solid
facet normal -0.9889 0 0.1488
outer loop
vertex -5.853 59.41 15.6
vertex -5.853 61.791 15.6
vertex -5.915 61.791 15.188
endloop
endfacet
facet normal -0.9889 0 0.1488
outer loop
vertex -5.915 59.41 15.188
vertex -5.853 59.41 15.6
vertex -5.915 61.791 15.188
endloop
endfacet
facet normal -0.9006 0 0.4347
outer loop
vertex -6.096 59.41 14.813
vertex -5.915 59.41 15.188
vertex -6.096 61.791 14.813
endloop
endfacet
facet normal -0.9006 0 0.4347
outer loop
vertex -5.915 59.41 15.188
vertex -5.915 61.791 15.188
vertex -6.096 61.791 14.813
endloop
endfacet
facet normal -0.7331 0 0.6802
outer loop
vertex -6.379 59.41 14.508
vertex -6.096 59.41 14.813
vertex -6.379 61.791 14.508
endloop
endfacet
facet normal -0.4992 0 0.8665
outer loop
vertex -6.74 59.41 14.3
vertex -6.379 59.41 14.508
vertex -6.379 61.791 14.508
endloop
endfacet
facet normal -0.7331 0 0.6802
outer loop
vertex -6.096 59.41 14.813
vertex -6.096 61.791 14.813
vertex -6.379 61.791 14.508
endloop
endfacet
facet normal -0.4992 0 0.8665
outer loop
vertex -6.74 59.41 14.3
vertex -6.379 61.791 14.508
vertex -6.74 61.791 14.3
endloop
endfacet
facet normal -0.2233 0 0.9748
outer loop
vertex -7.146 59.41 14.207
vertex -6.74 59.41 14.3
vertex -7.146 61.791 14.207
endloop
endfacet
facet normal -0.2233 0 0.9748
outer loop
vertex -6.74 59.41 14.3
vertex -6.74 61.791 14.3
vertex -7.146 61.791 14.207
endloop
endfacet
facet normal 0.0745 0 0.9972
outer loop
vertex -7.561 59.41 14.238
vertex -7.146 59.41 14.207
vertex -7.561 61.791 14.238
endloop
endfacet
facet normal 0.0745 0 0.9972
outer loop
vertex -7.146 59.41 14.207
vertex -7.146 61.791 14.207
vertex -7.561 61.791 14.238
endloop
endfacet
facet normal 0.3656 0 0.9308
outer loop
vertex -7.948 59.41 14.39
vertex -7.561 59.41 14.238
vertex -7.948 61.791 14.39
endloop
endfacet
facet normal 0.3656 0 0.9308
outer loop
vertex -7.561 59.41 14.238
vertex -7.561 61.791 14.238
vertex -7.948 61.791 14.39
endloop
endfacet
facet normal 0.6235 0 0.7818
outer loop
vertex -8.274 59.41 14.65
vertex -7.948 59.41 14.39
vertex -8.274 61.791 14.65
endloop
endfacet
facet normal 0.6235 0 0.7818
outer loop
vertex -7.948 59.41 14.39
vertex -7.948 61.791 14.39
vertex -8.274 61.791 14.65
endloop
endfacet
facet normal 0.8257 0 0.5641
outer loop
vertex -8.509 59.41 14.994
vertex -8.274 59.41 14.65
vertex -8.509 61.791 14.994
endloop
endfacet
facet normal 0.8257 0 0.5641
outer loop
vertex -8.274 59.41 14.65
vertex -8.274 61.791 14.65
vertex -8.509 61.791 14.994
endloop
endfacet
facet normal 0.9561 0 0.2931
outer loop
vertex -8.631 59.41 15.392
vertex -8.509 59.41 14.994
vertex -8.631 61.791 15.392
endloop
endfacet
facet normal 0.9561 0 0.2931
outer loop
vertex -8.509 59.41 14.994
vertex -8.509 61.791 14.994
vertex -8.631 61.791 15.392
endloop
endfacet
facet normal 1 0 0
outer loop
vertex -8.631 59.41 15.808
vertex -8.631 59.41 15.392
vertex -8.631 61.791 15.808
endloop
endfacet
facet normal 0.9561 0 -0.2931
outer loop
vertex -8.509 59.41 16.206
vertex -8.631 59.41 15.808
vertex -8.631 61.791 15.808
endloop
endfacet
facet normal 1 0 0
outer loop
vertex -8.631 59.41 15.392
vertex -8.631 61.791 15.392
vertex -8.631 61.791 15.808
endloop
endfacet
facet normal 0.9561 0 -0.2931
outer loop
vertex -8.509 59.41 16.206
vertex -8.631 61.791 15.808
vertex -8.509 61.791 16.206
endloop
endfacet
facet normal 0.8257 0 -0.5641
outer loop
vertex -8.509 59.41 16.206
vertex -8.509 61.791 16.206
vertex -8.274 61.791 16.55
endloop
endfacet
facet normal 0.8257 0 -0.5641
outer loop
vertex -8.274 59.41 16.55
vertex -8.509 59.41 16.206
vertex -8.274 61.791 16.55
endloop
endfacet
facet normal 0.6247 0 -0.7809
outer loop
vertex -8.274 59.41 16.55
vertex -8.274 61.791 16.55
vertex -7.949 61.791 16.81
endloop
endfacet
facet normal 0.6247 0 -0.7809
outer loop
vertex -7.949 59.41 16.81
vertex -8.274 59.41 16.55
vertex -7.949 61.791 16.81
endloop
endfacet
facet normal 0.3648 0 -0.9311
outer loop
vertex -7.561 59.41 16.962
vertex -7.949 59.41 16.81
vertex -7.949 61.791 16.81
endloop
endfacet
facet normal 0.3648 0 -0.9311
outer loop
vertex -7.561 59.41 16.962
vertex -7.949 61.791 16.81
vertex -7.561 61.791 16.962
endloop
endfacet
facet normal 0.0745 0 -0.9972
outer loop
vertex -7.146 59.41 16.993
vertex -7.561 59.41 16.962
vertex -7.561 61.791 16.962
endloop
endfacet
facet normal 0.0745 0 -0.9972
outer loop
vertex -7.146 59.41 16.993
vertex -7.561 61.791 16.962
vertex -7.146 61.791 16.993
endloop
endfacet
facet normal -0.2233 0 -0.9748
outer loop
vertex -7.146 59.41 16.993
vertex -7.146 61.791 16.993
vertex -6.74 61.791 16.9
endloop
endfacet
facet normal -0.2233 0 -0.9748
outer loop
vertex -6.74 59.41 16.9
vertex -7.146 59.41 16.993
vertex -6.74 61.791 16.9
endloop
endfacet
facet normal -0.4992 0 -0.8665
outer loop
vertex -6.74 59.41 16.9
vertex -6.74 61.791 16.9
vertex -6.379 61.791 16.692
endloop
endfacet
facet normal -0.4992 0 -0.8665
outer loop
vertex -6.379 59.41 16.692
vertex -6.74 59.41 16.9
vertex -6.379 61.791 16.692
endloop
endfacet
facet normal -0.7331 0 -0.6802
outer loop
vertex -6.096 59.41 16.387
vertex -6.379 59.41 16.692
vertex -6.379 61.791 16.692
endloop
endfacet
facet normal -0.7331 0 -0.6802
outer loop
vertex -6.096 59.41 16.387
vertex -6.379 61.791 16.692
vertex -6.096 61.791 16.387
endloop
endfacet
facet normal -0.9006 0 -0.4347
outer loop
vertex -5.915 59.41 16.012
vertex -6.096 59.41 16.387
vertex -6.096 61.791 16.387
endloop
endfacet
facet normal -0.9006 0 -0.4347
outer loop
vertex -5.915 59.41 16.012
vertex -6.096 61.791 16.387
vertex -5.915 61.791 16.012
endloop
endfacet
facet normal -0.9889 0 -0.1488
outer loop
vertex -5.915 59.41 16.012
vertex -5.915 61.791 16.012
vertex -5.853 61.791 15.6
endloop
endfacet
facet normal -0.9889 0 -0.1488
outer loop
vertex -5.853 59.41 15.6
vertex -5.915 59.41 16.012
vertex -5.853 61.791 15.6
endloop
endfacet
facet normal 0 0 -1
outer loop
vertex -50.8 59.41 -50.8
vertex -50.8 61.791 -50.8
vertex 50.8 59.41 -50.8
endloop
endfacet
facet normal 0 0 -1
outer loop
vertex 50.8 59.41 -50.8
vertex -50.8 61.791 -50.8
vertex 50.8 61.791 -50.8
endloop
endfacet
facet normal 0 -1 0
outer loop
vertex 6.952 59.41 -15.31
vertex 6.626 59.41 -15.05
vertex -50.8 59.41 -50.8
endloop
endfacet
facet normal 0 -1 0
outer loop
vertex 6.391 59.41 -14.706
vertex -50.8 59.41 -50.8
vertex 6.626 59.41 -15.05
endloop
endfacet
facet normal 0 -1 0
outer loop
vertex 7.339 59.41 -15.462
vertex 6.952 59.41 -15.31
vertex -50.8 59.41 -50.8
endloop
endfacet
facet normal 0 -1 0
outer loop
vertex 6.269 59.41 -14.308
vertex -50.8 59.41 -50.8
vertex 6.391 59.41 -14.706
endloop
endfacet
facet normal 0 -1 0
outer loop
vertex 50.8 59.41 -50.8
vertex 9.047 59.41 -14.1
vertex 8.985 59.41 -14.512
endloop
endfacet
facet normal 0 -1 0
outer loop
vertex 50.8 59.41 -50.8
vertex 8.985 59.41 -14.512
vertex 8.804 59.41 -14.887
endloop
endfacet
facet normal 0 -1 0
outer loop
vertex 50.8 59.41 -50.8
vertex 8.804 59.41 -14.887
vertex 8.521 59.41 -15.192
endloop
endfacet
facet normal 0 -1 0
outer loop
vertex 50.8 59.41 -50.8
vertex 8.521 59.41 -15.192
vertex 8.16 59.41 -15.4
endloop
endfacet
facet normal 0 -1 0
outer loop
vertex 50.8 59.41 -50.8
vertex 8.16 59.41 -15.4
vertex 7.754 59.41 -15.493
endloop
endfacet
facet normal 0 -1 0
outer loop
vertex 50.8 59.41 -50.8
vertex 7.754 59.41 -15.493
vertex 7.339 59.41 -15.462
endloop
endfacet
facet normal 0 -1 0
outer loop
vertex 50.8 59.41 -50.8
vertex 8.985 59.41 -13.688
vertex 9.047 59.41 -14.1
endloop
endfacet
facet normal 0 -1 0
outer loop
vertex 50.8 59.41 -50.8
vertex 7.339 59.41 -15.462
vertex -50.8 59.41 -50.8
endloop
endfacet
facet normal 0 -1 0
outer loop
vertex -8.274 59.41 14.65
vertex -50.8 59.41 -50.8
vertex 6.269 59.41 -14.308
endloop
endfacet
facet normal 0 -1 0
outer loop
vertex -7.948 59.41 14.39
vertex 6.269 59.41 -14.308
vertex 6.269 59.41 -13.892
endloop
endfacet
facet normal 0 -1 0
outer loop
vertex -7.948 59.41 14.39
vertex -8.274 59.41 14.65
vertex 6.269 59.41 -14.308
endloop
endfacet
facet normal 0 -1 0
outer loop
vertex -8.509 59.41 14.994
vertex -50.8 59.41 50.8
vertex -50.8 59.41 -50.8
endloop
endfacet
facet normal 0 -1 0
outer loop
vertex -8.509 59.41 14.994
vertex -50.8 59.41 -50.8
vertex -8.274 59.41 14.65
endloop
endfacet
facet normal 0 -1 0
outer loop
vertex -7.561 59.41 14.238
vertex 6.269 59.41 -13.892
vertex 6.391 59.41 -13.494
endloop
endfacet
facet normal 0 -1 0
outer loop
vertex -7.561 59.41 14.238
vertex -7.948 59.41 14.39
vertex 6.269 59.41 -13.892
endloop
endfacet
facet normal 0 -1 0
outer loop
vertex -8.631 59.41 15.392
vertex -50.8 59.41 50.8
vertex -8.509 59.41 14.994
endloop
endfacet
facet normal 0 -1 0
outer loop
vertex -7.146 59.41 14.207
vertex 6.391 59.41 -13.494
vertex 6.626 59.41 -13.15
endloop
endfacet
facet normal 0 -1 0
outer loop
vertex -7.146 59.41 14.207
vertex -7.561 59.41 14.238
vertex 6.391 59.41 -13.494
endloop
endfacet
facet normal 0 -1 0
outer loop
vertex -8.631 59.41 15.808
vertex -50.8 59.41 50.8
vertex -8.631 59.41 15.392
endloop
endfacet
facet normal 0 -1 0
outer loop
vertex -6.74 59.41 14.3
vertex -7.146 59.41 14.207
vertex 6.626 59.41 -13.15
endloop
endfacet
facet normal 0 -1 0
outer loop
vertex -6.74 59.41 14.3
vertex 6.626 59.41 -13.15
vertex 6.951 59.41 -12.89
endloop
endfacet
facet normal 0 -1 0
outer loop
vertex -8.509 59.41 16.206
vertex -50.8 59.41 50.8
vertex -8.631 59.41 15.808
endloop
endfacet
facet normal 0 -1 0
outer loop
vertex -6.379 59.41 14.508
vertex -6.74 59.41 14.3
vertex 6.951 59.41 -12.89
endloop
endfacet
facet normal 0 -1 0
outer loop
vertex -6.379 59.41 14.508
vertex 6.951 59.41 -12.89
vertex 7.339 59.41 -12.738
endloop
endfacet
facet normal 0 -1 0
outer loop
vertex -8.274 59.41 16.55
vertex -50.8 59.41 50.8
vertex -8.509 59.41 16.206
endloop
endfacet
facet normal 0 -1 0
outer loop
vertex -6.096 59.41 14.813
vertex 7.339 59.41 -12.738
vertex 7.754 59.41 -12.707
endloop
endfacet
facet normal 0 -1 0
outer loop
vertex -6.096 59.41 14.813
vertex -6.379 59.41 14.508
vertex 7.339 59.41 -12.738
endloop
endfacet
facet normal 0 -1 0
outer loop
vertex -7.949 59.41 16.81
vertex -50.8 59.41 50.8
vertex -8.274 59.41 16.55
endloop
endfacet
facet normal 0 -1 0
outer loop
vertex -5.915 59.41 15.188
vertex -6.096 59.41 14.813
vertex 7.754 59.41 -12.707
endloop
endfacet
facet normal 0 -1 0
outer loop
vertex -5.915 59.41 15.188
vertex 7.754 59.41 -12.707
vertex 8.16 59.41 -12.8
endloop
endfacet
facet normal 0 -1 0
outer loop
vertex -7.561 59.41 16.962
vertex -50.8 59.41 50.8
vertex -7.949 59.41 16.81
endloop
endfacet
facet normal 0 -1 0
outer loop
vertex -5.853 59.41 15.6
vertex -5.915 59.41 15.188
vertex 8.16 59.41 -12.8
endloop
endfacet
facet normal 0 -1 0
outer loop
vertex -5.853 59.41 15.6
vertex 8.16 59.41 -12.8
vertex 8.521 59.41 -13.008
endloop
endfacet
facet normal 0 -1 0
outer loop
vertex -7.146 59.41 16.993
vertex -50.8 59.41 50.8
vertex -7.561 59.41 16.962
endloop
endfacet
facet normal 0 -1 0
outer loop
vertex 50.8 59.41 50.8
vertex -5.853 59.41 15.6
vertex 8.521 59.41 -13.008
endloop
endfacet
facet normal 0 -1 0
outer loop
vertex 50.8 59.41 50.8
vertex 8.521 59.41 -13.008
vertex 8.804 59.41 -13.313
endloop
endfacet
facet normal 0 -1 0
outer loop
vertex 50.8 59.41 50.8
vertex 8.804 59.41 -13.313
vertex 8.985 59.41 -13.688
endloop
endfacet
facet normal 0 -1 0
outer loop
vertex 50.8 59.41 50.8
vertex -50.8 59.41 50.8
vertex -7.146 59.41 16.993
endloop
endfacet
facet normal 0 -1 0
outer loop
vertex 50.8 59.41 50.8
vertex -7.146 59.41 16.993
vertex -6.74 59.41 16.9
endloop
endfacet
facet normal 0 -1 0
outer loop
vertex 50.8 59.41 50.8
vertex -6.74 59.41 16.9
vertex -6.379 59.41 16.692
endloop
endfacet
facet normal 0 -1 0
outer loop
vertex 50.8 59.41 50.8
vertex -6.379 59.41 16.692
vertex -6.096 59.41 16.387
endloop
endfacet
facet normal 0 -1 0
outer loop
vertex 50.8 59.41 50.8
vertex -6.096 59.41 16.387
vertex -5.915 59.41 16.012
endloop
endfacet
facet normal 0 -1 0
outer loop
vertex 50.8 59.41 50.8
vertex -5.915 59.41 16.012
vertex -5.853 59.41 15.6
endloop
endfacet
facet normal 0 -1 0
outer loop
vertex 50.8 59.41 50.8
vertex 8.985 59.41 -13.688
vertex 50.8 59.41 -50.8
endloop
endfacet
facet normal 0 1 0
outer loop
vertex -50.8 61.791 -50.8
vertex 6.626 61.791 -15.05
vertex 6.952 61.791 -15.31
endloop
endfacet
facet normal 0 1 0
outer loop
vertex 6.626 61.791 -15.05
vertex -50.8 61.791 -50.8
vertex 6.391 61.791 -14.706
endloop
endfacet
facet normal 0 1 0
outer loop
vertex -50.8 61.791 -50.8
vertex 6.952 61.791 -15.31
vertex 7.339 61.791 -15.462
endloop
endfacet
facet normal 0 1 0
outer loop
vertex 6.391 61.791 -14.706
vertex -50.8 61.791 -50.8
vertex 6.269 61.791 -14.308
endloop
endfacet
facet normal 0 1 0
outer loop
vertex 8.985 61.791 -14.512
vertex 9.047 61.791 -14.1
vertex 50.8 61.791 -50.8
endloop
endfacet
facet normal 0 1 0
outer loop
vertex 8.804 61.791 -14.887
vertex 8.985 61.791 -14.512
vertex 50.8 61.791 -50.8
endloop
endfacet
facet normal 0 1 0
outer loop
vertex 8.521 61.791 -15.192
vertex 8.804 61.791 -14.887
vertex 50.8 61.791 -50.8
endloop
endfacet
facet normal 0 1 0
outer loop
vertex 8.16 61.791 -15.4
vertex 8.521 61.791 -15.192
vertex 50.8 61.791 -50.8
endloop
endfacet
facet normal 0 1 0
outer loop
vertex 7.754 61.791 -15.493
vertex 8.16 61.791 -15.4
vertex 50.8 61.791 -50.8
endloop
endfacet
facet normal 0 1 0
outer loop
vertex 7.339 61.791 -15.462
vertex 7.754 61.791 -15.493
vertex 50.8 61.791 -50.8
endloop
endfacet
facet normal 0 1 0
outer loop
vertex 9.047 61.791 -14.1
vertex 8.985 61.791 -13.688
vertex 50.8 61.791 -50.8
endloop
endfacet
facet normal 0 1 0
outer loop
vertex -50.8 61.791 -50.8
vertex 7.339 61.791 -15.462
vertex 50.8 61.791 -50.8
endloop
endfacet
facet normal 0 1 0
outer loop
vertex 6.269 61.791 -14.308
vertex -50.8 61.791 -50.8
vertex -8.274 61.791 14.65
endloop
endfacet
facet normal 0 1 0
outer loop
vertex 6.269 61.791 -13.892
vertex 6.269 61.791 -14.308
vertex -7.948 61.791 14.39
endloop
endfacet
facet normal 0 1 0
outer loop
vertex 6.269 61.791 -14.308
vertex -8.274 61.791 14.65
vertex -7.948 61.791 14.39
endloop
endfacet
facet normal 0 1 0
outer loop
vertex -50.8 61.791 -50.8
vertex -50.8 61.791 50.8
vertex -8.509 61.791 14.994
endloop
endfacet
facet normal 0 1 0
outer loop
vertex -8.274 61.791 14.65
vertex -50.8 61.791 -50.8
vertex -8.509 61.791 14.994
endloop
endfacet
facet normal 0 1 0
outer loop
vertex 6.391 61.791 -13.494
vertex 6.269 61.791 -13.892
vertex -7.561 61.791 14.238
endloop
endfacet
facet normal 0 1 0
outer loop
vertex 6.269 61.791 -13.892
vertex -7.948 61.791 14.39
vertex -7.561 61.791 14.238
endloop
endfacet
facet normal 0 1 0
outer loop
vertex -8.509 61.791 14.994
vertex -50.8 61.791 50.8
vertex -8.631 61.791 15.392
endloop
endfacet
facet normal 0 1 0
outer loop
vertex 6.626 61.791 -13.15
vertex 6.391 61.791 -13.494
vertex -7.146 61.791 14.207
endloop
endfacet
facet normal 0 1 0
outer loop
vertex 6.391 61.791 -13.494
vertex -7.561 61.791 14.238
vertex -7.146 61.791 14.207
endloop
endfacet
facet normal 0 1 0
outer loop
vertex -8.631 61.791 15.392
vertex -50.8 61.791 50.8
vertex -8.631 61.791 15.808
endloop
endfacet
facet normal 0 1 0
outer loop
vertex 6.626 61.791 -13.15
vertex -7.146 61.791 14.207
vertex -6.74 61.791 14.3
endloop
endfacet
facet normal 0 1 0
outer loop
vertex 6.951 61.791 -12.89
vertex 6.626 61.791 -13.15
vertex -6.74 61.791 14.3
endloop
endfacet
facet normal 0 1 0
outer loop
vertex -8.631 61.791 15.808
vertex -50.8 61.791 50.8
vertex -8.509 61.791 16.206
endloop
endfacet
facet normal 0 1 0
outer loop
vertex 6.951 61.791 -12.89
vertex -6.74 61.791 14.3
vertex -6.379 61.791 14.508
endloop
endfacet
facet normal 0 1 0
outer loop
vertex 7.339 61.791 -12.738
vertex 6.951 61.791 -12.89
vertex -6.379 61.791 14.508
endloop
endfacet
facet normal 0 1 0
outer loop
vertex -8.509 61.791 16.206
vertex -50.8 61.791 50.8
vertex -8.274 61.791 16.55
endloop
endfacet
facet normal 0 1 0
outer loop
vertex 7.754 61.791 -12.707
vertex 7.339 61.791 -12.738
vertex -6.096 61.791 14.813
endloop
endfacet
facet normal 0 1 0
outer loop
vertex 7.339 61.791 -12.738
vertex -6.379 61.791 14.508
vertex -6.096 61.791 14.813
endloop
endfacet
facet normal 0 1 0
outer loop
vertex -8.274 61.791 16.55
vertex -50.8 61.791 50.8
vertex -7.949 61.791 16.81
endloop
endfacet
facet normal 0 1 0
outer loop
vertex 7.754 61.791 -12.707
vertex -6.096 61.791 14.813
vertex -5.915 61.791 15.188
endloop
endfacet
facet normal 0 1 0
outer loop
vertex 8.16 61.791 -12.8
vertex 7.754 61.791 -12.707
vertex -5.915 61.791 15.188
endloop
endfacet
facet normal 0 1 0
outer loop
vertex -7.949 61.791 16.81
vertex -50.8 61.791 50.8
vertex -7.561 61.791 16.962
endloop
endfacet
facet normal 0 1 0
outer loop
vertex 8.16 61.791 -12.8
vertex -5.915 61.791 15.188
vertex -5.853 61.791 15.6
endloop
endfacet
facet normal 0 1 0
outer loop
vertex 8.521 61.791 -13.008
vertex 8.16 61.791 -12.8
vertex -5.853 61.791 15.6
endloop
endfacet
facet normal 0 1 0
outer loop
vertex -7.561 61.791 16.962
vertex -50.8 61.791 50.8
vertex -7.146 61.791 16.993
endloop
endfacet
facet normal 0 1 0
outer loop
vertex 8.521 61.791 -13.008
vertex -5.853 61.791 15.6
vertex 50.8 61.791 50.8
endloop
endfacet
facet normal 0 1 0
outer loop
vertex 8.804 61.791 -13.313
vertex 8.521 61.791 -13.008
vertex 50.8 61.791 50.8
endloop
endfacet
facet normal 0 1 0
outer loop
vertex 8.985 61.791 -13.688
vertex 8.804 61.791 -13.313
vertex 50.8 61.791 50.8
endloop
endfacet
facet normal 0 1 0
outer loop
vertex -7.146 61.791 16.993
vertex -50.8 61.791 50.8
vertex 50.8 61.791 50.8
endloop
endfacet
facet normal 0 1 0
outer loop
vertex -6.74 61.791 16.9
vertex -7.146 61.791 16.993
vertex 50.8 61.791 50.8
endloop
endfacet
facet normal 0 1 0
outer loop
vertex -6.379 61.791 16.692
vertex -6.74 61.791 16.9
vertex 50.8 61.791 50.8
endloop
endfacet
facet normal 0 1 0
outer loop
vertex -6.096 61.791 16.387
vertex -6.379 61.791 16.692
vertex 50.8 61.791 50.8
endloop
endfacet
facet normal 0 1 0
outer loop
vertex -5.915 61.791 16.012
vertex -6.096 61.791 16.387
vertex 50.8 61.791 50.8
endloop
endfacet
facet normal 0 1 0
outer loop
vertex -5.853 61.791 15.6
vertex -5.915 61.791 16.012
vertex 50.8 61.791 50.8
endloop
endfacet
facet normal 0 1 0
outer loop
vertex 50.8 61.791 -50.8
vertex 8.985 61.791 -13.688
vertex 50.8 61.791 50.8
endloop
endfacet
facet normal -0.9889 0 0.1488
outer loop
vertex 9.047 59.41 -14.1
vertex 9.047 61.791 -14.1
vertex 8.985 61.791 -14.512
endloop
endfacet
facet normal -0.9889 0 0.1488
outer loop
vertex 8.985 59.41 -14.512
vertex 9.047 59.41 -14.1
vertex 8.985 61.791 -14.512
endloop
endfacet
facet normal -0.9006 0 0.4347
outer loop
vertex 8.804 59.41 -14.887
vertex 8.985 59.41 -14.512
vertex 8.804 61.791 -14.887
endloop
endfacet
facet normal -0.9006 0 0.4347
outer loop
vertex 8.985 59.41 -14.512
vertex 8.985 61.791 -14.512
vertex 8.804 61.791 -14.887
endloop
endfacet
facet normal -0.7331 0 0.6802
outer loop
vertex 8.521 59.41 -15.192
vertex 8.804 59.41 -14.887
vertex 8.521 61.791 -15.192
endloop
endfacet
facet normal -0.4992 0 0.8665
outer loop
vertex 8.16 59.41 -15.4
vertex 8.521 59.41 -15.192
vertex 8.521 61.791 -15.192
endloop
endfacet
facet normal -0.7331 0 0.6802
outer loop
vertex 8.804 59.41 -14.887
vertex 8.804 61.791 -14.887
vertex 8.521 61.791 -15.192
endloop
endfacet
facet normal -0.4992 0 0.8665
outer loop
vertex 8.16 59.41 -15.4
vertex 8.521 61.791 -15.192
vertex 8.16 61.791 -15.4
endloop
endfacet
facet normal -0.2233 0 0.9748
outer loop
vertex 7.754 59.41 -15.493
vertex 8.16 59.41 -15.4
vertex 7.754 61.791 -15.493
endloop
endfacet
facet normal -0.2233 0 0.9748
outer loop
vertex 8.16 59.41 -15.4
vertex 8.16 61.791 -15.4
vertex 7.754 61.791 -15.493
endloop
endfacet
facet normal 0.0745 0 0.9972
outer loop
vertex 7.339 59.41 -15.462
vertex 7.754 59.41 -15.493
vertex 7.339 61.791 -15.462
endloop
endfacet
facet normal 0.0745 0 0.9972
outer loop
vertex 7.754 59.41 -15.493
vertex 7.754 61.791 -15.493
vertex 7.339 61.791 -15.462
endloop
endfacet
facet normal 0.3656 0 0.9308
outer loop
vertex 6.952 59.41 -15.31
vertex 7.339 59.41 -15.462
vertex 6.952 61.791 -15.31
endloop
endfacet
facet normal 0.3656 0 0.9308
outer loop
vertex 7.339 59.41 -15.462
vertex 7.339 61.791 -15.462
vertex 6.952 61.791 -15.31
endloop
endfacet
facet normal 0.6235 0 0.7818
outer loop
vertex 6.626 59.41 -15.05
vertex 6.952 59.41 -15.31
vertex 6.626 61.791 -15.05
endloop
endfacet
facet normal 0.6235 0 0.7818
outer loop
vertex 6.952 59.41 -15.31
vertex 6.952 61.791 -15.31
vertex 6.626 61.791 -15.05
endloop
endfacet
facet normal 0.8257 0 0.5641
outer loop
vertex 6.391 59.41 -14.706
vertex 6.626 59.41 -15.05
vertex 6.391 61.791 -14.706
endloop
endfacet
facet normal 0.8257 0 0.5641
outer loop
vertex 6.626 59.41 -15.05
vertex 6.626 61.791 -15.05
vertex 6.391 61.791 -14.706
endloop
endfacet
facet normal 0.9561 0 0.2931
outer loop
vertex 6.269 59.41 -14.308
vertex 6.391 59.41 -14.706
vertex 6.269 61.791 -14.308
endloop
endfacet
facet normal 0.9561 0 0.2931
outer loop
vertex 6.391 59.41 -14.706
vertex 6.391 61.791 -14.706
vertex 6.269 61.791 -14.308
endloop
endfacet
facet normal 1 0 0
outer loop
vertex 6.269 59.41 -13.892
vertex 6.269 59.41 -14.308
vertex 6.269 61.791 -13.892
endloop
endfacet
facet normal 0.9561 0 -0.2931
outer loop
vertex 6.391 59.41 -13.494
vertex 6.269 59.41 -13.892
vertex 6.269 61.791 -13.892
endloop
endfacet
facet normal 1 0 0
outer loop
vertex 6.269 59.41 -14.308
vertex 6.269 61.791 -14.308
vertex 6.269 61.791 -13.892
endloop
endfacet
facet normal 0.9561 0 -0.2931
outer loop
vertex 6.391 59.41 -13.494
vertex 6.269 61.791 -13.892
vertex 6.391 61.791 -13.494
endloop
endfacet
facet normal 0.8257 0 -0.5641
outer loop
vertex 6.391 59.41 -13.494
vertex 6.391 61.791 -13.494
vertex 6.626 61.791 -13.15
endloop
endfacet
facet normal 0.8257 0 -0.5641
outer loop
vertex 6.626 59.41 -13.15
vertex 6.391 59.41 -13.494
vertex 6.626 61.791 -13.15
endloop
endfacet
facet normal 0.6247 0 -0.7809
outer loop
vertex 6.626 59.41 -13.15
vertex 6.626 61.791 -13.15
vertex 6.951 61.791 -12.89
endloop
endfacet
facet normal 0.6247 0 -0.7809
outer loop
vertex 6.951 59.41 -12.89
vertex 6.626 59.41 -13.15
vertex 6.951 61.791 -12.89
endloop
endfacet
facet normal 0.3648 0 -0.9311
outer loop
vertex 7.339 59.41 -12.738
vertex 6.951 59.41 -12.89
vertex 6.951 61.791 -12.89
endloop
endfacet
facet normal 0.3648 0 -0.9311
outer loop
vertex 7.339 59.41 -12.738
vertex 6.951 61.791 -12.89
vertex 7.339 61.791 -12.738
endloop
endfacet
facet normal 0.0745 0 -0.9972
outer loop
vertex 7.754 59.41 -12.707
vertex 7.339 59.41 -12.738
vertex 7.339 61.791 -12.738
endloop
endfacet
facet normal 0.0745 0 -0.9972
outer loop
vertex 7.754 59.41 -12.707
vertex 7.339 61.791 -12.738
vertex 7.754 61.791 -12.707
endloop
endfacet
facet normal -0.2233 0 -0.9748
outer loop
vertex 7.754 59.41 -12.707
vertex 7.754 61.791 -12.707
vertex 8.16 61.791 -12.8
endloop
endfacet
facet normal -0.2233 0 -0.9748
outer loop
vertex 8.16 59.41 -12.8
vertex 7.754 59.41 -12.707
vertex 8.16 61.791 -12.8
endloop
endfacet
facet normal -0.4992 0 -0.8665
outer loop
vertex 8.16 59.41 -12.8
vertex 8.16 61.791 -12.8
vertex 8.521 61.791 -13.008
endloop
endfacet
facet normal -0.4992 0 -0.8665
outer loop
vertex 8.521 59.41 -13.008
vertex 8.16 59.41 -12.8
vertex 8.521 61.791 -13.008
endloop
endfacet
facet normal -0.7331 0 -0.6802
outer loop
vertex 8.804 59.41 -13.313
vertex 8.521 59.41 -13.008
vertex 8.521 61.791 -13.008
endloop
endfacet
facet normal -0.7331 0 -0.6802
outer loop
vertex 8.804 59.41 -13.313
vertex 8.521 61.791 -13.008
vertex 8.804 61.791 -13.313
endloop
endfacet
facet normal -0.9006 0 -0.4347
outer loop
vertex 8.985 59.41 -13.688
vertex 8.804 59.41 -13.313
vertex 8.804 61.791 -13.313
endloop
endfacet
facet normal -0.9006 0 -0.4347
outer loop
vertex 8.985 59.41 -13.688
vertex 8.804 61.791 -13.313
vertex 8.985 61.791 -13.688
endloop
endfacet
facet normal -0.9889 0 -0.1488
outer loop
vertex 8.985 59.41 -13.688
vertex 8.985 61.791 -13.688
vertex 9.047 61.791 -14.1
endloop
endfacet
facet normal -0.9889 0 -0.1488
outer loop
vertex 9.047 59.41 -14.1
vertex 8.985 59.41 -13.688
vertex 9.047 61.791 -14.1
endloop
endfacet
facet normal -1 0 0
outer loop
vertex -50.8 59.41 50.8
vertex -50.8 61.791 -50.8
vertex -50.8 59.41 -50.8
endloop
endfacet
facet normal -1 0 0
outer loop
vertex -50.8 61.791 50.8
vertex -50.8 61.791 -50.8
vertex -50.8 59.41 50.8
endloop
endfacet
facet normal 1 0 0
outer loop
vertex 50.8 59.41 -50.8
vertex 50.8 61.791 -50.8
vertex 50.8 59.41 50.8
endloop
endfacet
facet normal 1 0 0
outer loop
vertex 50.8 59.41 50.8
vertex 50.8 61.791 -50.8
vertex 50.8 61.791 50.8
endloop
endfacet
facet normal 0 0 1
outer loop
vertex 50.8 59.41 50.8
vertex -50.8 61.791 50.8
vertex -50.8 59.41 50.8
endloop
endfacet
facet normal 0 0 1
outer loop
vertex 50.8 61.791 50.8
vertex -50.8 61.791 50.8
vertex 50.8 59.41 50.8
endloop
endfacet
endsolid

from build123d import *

# Parameters (mm, degrees)
SKETCH1_W             = 101.6
SKETCH1_H             = 101.6
BOSS_EXTRUDE1_DEPTH   = 2.38125
F_2_5MM_DOWEL_HOLE1_D = 2.794


with BuildPart() as part:
    # Sketch1 → Boss-Extrude1 (new body)
    with BuildSketch(Plane.XZ.offset(-61.790986141)):
        Rectangle(SKETCH1_W, SKETCH1_H)
    extrude(amount=BOSS_EXTRUDE1_DEPTH)

    # Ø2.5mm Dowel Hole1 (through all)
    with Locations(Plane(origin=(0, 59.409736141, 0), x_dir=(-1, 0, 0), z_dir=(0, -1, 0))):
        with Locations((7.25, -15.6), (-7.65, 14.1)):
            Hole(F_2_5MM_DOWEL_HOLE1_D / 2)


solid = part.part
